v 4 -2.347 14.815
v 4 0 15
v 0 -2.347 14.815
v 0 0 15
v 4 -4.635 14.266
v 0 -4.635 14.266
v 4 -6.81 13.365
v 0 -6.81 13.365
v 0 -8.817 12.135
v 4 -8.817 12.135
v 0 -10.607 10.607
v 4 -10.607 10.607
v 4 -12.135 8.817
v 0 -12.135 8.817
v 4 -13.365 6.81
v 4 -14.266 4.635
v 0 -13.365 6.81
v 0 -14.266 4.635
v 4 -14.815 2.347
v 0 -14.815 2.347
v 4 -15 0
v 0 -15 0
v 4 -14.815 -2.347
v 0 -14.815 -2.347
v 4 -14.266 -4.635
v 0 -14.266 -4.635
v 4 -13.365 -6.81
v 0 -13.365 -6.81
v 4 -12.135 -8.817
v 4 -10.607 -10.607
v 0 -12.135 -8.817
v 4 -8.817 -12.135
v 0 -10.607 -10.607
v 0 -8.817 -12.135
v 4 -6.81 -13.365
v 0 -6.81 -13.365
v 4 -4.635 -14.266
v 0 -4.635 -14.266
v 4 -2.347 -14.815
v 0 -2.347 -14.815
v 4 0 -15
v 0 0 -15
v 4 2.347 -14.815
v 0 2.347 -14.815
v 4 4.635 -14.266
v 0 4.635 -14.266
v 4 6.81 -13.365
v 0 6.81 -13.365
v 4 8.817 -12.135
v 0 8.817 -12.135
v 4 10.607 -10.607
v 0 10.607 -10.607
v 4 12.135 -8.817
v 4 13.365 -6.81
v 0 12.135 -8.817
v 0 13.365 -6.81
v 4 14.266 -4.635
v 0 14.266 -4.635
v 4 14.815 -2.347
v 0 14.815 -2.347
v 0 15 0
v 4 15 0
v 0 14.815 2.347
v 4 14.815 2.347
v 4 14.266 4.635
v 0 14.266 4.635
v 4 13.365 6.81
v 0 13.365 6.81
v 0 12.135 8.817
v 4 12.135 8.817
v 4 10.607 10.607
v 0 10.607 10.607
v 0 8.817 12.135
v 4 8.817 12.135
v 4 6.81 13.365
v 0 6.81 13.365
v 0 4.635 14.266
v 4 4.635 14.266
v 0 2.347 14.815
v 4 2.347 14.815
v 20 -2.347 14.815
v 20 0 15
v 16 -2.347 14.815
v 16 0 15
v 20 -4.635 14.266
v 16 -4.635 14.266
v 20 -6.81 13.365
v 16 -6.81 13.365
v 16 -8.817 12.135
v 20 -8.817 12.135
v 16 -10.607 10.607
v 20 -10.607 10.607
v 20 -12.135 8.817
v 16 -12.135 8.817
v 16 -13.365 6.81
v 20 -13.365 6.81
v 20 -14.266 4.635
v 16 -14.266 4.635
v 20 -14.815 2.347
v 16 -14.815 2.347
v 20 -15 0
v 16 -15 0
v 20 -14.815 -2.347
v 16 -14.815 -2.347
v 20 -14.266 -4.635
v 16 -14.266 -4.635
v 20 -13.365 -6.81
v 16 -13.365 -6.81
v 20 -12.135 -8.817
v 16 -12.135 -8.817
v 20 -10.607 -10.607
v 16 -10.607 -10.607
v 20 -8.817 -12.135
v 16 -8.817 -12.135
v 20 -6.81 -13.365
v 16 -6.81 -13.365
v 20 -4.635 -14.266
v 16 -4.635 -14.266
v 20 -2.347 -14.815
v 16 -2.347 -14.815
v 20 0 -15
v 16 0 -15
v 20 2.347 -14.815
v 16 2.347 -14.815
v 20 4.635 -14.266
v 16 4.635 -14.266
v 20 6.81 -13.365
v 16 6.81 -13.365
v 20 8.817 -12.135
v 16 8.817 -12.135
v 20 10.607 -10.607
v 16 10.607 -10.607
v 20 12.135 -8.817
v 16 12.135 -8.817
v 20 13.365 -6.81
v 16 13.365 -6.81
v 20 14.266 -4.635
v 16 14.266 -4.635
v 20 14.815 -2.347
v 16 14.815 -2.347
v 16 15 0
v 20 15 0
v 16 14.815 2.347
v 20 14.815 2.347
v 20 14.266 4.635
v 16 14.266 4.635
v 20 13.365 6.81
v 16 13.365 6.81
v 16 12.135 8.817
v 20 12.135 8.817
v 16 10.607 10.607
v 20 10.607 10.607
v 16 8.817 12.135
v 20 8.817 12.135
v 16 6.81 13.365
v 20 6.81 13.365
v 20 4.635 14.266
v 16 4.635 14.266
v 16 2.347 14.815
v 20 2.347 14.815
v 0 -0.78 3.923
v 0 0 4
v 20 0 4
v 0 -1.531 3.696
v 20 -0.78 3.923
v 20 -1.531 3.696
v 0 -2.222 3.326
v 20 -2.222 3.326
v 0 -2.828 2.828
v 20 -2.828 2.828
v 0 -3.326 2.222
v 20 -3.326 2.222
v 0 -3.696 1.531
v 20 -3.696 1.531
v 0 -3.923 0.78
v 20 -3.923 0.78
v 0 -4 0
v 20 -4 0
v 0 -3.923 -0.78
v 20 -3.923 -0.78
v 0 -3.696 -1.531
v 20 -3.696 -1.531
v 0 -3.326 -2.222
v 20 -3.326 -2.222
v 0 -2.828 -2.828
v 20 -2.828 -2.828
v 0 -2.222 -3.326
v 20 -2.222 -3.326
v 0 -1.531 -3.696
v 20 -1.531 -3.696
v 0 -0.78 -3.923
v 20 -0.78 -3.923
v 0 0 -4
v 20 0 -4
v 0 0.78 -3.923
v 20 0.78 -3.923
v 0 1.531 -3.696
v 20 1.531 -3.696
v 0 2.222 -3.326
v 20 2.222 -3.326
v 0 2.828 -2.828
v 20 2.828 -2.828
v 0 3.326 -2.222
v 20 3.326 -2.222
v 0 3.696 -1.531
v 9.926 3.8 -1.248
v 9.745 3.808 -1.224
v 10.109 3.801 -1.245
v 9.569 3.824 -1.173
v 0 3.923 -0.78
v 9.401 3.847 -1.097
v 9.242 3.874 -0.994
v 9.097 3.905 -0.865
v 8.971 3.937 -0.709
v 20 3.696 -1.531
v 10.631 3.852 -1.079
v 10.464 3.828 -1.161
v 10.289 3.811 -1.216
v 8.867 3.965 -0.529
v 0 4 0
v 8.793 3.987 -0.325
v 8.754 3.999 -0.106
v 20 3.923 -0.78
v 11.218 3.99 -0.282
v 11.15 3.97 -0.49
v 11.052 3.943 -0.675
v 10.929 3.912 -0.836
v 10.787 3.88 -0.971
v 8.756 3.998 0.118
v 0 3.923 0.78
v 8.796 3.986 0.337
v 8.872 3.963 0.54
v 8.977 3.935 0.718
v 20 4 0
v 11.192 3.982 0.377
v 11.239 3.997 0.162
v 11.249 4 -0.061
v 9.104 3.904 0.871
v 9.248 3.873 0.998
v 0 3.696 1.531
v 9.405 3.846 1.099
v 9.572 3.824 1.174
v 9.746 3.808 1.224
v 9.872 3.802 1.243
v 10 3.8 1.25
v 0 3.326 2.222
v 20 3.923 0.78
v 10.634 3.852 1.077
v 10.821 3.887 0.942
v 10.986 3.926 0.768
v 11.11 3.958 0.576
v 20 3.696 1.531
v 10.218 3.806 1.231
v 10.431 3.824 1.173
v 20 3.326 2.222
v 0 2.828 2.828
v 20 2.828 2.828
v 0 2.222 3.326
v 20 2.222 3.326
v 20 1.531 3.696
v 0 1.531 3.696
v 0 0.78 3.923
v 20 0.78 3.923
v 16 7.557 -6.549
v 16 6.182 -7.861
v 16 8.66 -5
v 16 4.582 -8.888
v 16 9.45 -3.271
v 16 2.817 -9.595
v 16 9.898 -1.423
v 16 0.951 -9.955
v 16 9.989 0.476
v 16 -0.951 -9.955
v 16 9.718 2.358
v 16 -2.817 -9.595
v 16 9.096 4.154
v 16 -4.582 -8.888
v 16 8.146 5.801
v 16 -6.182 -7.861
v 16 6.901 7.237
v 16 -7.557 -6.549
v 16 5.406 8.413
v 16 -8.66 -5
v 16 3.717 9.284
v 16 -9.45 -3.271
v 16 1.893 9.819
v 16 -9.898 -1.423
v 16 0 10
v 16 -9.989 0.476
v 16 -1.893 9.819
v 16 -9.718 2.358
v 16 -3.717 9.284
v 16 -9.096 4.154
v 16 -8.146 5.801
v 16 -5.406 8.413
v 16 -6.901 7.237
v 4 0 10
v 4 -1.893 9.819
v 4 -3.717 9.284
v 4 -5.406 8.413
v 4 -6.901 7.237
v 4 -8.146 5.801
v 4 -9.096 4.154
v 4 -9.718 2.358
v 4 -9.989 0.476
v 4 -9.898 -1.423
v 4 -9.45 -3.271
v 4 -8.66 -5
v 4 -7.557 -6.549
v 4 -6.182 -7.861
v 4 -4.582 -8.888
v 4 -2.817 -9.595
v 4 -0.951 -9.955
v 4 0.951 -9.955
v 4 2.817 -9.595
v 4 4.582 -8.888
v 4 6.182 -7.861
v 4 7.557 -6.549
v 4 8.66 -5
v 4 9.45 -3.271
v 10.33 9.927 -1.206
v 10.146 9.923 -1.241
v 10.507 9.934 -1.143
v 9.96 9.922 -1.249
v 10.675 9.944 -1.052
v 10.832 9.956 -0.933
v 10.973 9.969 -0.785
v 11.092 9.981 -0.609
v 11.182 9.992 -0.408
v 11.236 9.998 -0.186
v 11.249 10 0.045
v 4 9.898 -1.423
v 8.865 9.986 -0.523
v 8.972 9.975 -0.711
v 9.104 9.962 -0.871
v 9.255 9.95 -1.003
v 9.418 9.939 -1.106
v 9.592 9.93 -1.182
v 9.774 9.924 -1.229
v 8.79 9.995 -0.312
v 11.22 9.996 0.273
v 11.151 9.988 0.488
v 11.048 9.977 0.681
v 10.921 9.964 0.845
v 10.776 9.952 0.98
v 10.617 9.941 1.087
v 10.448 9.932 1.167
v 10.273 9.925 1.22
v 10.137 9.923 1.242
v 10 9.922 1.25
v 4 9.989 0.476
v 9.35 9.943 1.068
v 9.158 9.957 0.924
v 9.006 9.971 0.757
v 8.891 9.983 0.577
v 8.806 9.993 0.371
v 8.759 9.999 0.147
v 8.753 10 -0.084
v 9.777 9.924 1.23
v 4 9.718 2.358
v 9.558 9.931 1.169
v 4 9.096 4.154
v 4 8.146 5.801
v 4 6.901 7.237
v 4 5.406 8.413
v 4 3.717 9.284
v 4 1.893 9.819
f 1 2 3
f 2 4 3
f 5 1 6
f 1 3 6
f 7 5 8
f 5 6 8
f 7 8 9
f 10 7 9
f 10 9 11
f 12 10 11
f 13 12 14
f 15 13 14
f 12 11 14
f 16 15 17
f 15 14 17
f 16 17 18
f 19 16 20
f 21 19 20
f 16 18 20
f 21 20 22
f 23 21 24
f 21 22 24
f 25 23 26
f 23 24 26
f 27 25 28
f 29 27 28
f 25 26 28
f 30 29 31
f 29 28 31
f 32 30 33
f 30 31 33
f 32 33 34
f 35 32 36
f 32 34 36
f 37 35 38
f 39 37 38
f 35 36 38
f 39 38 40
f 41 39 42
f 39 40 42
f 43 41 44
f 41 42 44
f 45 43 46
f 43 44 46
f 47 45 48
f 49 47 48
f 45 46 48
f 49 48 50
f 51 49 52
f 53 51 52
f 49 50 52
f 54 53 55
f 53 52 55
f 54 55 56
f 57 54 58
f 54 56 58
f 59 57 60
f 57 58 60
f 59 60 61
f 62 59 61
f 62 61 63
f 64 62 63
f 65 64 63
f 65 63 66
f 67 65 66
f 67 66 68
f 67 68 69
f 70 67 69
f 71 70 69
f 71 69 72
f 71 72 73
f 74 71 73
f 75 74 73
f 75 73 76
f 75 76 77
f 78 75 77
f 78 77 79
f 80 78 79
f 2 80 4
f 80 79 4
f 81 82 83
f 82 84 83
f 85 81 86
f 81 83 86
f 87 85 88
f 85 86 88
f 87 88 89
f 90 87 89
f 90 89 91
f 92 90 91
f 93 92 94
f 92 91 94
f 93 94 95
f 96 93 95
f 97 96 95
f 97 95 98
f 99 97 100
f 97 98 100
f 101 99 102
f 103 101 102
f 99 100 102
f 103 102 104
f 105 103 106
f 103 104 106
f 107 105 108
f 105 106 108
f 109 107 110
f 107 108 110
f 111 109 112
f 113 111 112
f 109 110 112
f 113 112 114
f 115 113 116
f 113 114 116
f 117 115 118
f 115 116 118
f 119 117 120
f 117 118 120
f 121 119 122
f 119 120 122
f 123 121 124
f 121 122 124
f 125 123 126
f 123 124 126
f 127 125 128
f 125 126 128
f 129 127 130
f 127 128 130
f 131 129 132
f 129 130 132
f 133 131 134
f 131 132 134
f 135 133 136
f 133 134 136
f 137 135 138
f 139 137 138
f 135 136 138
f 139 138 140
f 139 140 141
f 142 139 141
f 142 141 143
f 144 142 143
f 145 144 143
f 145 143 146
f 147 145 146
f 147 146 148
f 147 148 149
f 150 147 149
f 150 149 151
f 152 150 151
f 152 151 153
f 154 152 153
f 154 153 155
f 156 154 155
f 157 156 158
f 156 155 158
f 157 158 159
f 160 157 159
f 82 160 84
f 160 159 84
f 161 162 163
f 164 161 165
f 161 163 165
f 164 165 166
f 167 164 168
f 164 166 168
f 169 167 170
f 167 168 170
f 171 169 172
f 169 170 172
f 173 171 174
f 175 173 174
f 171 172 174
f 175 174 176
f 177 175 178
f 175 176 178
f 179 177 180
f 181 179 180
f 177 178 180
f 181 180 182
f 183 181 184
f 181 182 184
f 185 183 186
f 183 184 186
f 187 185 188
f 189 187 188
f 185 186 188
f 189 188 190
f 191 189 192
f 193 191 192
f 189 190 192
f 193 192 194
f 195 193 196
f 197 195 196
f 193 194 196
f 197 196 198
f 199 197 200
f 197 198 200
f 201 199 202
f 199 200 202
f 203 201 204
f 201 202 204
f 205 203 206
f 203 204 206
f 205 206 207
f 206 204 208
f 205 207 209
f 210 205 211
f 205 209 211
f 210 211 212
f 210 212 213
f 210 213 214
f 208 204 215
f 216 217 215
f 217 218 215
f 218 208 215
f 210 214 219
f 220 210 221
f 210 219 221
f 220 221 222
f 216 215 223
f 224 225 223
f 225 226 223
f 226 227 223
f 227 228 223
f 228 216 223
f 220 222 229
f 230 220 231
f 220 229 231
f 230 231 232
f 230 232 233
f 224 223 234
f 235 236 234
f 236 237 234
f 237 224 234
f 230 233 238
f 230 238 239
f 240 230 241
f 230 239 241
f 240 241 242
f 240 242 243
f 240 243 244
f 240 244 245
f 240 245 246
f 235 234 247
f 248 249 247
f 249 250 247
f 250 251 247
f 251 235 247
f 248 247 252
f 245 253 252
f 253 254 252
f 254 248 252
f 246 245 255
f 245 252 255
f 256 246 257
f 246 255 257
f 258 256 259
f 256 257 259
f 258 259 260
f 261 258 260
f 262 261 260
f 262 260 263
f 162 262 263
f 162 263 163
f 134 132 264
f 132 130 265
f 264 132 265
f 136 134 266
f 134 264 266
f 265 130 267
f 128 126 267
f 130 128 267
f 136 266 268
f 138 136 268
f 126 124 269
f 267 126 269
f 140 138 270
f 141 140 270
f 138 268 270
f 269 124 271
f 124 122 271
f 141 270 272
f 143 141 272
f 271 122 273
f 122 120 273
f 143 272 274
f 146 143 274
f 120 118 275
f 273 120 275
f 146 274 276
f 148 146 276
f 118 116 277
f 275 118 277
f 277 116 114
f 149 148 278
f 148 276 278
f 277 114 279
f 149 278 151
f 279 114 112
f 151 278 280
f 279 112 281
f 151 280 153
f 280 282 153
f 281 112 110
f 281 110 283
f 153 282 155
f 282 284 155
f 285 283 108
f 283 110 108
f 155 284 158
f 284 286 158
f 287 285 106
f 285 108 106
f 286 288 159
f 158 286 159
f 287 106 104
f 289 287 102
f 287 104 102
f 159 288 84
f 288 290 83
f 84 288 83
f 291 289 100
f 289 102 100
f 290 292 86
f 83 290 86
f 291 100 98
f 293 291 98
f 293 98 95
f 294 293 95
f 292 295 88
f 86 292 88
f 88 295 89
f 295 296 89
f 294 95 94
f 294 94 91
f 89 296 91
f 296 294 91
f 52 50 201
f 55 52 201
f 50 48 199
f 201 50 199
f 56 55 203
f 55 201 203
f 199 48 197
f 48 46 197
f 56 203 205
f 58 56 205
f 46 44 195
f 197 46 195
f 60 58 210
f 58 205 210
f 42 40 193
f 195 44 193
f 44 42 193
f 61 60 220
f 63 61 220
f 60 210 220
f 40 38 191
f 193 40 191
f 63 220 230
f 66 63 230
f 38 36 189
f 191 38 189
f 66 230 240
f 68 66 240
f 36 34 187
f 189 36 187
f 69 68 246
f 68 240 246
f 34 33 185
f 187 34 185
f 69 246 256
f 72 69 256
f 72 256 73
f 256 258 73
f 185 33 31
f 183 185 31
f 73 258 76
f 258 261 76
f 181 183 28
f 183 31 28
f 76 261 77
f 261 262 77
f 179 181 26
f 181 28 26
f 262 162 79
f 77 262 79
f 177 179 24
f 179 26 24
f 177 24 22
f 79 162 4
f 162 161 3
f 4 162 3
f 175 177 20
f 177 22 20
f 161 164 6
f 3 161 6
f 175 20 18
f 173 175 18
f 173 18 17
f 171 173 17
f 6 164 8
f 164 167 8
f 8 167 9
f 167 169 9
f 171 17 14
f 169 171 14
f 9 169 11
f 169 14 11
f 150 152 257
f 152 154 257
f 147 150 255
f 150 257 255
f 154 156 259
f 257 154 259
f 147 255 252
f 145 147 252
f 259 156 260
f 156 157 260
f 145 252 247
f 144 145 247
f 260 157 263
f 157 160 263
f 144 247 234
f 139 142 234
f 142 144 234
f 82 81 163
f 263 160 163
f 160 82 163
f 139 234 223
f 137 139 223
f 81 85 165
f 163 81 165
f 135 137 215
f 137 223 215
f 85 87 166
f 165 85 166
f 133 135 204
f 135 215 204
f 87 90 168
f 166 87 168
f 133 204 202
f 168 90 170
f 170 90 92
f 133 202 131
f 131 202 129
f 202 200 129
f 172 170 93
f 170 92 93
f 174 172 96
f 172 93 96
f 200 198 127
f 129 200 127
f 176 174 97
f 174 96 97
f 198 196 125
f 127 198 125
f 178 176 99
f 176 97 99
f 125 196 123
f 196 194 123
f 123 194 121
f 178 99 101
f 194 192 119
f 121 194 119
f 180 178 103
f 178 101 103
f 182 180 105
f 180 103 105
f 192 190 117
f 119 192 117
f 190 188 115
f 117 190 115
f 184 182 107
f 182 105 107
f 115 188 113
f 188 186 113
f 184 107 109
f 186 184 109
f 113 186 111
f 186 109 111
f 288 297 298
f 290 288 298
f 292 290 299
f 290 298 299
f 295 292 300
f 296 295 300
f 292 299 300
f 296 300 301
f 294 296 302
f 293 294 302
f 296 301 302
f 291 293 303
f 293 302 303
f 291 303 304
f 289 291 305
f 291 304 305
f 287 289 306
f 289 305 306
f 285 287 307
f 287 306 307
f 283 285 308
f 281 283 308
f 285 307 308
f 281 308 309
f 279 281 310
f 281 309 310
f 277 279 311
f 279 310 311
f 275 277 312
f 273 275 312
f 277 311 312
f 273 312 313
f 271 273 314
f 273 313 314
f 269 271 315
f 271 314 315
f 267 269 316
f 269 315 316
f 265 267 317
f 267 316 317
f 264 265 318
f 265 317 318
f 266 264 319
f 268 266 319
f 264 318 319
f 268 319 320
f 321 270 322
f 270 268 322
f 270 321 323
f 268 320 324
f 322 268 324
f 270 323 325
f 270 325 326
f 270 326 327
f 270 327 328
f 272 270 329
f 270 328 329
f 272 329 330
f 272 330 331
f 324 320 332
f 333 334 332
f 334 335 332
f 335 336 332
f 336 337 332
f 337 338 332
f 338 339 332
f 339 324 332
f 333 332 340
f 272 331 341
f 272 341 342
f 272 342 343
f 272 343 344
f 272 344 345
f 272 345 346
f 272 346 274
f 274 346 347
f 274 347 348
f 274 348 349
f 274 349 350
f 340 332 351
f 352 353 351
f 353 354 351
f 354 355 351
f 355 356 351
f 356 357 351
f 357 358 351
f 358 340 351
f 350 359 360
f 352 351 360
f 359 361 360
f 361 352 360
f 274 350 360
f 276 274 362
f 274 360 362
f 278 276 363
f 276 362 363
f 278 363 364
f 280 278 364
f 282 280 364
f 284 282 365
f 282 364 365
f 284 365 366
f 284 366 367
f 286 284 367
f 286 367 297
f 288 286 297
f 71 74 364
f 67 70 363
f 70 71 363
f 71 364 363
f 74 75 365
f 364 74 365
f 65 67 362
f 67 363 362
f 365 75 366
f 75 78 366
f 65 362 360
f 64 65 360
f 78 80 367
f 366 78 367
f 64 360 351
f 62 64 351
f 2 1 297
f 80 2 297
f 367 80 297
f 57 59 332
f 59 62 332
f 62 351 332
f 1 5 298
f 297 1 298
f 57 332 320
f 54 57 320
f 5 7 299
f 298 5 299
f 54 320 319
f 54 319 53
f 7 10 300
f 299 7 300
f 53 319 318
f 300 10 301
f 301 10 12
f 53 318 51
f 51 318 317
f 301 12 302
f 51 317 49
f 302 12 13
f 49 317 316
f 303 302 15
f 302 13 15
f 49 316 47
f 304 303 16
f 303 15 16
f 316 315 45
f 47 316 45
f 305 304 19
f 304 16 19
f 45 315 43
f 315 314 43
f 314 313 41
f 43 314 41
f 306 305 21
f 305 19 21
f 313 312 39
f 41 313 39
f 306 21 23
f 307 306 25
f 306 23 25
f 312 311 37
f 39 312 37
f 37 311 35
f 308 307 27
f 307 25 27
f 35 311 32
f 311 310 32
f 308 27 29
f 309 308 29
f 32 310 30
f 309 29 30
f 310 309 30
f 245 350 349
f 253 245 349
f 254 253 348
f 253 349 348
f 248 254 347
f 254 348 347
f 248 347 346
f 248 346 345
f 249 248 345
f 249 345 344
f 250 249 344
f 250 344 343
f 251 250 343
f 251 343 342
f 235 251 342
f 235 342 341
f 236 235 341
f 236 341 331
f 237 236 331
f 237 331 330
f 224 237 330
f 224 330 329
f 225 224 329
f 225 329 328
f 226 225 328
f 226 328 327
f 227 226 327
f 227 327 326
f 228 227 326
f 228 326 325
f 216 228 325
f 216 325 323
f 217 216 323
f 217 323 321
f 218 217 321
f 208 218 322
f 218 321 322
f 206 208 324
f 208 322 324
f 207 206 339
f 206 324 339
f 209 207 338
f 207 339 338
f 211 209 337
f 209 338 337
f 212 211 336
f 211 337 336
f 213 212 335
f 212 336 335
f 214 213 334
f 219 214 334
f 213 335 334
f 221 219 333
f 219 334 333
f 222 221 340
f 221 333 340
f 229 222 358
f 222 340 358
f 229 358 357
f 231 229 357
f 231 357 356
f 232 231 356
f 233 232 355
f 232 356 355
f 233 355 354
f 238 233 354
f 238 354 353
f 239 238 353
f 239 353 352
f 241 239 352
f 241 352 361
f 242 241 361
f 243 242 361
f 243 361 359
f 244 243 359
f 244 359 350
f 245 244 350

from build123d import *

# Parameters (mm, degrees)
M3_TAPPED_HOLE1_REACH  = 32.822
M3_TAPPED_HOLE1_BORE_R = 1.25


with BuildPart() as part:
    # Sketch1 → Revolve1 (revolve)
    with BuildSketch(Plane(origin=(0, 0, 0), x_dir=(1, 0, 0), z_dir=(0, 1, 0)), mode=Mode.PRIVATE) as revolve1_sk:
        Polygon((0, 4), (20, 4), (20, 15), (16, 15), (16, 10), (4, 10), (4, 15), (0, 15), align=None)
    revolve(revolve1_sk.sketch.rotate(Axis((0, 0, 0), (1, 0, 0)), 180), axis=Axis((0, 0, 0), (1, 0, 0)))

    # M3 Tapped Hole1 bore (on position points) → M3 Tapped Hole1 (cut, up to next)
    with BuildSketch(Plane(origin=(10, 10, 0), x_dir=(0, 0, 1), z_dir=(0, 1, 0)), mode=Mode.PRIVATE) as m3_tapped_hole1_sk1:
        Circle(M3_TAPPED_HOLE1_BORE_R)
    m3_tapped_hole1_tool1 = extrude(m3_tapped_hole1_sk1.sketch, amount=-M3_TAPPED_HOLE1_REACH, mode=Mode.PRIVATE) & part.part
    add(m3_tapped_hole1_tool1.solids().sort_by_distance((10, 10, 0))[0], mode=Mode.SUBTRACT)


solid = part.part
